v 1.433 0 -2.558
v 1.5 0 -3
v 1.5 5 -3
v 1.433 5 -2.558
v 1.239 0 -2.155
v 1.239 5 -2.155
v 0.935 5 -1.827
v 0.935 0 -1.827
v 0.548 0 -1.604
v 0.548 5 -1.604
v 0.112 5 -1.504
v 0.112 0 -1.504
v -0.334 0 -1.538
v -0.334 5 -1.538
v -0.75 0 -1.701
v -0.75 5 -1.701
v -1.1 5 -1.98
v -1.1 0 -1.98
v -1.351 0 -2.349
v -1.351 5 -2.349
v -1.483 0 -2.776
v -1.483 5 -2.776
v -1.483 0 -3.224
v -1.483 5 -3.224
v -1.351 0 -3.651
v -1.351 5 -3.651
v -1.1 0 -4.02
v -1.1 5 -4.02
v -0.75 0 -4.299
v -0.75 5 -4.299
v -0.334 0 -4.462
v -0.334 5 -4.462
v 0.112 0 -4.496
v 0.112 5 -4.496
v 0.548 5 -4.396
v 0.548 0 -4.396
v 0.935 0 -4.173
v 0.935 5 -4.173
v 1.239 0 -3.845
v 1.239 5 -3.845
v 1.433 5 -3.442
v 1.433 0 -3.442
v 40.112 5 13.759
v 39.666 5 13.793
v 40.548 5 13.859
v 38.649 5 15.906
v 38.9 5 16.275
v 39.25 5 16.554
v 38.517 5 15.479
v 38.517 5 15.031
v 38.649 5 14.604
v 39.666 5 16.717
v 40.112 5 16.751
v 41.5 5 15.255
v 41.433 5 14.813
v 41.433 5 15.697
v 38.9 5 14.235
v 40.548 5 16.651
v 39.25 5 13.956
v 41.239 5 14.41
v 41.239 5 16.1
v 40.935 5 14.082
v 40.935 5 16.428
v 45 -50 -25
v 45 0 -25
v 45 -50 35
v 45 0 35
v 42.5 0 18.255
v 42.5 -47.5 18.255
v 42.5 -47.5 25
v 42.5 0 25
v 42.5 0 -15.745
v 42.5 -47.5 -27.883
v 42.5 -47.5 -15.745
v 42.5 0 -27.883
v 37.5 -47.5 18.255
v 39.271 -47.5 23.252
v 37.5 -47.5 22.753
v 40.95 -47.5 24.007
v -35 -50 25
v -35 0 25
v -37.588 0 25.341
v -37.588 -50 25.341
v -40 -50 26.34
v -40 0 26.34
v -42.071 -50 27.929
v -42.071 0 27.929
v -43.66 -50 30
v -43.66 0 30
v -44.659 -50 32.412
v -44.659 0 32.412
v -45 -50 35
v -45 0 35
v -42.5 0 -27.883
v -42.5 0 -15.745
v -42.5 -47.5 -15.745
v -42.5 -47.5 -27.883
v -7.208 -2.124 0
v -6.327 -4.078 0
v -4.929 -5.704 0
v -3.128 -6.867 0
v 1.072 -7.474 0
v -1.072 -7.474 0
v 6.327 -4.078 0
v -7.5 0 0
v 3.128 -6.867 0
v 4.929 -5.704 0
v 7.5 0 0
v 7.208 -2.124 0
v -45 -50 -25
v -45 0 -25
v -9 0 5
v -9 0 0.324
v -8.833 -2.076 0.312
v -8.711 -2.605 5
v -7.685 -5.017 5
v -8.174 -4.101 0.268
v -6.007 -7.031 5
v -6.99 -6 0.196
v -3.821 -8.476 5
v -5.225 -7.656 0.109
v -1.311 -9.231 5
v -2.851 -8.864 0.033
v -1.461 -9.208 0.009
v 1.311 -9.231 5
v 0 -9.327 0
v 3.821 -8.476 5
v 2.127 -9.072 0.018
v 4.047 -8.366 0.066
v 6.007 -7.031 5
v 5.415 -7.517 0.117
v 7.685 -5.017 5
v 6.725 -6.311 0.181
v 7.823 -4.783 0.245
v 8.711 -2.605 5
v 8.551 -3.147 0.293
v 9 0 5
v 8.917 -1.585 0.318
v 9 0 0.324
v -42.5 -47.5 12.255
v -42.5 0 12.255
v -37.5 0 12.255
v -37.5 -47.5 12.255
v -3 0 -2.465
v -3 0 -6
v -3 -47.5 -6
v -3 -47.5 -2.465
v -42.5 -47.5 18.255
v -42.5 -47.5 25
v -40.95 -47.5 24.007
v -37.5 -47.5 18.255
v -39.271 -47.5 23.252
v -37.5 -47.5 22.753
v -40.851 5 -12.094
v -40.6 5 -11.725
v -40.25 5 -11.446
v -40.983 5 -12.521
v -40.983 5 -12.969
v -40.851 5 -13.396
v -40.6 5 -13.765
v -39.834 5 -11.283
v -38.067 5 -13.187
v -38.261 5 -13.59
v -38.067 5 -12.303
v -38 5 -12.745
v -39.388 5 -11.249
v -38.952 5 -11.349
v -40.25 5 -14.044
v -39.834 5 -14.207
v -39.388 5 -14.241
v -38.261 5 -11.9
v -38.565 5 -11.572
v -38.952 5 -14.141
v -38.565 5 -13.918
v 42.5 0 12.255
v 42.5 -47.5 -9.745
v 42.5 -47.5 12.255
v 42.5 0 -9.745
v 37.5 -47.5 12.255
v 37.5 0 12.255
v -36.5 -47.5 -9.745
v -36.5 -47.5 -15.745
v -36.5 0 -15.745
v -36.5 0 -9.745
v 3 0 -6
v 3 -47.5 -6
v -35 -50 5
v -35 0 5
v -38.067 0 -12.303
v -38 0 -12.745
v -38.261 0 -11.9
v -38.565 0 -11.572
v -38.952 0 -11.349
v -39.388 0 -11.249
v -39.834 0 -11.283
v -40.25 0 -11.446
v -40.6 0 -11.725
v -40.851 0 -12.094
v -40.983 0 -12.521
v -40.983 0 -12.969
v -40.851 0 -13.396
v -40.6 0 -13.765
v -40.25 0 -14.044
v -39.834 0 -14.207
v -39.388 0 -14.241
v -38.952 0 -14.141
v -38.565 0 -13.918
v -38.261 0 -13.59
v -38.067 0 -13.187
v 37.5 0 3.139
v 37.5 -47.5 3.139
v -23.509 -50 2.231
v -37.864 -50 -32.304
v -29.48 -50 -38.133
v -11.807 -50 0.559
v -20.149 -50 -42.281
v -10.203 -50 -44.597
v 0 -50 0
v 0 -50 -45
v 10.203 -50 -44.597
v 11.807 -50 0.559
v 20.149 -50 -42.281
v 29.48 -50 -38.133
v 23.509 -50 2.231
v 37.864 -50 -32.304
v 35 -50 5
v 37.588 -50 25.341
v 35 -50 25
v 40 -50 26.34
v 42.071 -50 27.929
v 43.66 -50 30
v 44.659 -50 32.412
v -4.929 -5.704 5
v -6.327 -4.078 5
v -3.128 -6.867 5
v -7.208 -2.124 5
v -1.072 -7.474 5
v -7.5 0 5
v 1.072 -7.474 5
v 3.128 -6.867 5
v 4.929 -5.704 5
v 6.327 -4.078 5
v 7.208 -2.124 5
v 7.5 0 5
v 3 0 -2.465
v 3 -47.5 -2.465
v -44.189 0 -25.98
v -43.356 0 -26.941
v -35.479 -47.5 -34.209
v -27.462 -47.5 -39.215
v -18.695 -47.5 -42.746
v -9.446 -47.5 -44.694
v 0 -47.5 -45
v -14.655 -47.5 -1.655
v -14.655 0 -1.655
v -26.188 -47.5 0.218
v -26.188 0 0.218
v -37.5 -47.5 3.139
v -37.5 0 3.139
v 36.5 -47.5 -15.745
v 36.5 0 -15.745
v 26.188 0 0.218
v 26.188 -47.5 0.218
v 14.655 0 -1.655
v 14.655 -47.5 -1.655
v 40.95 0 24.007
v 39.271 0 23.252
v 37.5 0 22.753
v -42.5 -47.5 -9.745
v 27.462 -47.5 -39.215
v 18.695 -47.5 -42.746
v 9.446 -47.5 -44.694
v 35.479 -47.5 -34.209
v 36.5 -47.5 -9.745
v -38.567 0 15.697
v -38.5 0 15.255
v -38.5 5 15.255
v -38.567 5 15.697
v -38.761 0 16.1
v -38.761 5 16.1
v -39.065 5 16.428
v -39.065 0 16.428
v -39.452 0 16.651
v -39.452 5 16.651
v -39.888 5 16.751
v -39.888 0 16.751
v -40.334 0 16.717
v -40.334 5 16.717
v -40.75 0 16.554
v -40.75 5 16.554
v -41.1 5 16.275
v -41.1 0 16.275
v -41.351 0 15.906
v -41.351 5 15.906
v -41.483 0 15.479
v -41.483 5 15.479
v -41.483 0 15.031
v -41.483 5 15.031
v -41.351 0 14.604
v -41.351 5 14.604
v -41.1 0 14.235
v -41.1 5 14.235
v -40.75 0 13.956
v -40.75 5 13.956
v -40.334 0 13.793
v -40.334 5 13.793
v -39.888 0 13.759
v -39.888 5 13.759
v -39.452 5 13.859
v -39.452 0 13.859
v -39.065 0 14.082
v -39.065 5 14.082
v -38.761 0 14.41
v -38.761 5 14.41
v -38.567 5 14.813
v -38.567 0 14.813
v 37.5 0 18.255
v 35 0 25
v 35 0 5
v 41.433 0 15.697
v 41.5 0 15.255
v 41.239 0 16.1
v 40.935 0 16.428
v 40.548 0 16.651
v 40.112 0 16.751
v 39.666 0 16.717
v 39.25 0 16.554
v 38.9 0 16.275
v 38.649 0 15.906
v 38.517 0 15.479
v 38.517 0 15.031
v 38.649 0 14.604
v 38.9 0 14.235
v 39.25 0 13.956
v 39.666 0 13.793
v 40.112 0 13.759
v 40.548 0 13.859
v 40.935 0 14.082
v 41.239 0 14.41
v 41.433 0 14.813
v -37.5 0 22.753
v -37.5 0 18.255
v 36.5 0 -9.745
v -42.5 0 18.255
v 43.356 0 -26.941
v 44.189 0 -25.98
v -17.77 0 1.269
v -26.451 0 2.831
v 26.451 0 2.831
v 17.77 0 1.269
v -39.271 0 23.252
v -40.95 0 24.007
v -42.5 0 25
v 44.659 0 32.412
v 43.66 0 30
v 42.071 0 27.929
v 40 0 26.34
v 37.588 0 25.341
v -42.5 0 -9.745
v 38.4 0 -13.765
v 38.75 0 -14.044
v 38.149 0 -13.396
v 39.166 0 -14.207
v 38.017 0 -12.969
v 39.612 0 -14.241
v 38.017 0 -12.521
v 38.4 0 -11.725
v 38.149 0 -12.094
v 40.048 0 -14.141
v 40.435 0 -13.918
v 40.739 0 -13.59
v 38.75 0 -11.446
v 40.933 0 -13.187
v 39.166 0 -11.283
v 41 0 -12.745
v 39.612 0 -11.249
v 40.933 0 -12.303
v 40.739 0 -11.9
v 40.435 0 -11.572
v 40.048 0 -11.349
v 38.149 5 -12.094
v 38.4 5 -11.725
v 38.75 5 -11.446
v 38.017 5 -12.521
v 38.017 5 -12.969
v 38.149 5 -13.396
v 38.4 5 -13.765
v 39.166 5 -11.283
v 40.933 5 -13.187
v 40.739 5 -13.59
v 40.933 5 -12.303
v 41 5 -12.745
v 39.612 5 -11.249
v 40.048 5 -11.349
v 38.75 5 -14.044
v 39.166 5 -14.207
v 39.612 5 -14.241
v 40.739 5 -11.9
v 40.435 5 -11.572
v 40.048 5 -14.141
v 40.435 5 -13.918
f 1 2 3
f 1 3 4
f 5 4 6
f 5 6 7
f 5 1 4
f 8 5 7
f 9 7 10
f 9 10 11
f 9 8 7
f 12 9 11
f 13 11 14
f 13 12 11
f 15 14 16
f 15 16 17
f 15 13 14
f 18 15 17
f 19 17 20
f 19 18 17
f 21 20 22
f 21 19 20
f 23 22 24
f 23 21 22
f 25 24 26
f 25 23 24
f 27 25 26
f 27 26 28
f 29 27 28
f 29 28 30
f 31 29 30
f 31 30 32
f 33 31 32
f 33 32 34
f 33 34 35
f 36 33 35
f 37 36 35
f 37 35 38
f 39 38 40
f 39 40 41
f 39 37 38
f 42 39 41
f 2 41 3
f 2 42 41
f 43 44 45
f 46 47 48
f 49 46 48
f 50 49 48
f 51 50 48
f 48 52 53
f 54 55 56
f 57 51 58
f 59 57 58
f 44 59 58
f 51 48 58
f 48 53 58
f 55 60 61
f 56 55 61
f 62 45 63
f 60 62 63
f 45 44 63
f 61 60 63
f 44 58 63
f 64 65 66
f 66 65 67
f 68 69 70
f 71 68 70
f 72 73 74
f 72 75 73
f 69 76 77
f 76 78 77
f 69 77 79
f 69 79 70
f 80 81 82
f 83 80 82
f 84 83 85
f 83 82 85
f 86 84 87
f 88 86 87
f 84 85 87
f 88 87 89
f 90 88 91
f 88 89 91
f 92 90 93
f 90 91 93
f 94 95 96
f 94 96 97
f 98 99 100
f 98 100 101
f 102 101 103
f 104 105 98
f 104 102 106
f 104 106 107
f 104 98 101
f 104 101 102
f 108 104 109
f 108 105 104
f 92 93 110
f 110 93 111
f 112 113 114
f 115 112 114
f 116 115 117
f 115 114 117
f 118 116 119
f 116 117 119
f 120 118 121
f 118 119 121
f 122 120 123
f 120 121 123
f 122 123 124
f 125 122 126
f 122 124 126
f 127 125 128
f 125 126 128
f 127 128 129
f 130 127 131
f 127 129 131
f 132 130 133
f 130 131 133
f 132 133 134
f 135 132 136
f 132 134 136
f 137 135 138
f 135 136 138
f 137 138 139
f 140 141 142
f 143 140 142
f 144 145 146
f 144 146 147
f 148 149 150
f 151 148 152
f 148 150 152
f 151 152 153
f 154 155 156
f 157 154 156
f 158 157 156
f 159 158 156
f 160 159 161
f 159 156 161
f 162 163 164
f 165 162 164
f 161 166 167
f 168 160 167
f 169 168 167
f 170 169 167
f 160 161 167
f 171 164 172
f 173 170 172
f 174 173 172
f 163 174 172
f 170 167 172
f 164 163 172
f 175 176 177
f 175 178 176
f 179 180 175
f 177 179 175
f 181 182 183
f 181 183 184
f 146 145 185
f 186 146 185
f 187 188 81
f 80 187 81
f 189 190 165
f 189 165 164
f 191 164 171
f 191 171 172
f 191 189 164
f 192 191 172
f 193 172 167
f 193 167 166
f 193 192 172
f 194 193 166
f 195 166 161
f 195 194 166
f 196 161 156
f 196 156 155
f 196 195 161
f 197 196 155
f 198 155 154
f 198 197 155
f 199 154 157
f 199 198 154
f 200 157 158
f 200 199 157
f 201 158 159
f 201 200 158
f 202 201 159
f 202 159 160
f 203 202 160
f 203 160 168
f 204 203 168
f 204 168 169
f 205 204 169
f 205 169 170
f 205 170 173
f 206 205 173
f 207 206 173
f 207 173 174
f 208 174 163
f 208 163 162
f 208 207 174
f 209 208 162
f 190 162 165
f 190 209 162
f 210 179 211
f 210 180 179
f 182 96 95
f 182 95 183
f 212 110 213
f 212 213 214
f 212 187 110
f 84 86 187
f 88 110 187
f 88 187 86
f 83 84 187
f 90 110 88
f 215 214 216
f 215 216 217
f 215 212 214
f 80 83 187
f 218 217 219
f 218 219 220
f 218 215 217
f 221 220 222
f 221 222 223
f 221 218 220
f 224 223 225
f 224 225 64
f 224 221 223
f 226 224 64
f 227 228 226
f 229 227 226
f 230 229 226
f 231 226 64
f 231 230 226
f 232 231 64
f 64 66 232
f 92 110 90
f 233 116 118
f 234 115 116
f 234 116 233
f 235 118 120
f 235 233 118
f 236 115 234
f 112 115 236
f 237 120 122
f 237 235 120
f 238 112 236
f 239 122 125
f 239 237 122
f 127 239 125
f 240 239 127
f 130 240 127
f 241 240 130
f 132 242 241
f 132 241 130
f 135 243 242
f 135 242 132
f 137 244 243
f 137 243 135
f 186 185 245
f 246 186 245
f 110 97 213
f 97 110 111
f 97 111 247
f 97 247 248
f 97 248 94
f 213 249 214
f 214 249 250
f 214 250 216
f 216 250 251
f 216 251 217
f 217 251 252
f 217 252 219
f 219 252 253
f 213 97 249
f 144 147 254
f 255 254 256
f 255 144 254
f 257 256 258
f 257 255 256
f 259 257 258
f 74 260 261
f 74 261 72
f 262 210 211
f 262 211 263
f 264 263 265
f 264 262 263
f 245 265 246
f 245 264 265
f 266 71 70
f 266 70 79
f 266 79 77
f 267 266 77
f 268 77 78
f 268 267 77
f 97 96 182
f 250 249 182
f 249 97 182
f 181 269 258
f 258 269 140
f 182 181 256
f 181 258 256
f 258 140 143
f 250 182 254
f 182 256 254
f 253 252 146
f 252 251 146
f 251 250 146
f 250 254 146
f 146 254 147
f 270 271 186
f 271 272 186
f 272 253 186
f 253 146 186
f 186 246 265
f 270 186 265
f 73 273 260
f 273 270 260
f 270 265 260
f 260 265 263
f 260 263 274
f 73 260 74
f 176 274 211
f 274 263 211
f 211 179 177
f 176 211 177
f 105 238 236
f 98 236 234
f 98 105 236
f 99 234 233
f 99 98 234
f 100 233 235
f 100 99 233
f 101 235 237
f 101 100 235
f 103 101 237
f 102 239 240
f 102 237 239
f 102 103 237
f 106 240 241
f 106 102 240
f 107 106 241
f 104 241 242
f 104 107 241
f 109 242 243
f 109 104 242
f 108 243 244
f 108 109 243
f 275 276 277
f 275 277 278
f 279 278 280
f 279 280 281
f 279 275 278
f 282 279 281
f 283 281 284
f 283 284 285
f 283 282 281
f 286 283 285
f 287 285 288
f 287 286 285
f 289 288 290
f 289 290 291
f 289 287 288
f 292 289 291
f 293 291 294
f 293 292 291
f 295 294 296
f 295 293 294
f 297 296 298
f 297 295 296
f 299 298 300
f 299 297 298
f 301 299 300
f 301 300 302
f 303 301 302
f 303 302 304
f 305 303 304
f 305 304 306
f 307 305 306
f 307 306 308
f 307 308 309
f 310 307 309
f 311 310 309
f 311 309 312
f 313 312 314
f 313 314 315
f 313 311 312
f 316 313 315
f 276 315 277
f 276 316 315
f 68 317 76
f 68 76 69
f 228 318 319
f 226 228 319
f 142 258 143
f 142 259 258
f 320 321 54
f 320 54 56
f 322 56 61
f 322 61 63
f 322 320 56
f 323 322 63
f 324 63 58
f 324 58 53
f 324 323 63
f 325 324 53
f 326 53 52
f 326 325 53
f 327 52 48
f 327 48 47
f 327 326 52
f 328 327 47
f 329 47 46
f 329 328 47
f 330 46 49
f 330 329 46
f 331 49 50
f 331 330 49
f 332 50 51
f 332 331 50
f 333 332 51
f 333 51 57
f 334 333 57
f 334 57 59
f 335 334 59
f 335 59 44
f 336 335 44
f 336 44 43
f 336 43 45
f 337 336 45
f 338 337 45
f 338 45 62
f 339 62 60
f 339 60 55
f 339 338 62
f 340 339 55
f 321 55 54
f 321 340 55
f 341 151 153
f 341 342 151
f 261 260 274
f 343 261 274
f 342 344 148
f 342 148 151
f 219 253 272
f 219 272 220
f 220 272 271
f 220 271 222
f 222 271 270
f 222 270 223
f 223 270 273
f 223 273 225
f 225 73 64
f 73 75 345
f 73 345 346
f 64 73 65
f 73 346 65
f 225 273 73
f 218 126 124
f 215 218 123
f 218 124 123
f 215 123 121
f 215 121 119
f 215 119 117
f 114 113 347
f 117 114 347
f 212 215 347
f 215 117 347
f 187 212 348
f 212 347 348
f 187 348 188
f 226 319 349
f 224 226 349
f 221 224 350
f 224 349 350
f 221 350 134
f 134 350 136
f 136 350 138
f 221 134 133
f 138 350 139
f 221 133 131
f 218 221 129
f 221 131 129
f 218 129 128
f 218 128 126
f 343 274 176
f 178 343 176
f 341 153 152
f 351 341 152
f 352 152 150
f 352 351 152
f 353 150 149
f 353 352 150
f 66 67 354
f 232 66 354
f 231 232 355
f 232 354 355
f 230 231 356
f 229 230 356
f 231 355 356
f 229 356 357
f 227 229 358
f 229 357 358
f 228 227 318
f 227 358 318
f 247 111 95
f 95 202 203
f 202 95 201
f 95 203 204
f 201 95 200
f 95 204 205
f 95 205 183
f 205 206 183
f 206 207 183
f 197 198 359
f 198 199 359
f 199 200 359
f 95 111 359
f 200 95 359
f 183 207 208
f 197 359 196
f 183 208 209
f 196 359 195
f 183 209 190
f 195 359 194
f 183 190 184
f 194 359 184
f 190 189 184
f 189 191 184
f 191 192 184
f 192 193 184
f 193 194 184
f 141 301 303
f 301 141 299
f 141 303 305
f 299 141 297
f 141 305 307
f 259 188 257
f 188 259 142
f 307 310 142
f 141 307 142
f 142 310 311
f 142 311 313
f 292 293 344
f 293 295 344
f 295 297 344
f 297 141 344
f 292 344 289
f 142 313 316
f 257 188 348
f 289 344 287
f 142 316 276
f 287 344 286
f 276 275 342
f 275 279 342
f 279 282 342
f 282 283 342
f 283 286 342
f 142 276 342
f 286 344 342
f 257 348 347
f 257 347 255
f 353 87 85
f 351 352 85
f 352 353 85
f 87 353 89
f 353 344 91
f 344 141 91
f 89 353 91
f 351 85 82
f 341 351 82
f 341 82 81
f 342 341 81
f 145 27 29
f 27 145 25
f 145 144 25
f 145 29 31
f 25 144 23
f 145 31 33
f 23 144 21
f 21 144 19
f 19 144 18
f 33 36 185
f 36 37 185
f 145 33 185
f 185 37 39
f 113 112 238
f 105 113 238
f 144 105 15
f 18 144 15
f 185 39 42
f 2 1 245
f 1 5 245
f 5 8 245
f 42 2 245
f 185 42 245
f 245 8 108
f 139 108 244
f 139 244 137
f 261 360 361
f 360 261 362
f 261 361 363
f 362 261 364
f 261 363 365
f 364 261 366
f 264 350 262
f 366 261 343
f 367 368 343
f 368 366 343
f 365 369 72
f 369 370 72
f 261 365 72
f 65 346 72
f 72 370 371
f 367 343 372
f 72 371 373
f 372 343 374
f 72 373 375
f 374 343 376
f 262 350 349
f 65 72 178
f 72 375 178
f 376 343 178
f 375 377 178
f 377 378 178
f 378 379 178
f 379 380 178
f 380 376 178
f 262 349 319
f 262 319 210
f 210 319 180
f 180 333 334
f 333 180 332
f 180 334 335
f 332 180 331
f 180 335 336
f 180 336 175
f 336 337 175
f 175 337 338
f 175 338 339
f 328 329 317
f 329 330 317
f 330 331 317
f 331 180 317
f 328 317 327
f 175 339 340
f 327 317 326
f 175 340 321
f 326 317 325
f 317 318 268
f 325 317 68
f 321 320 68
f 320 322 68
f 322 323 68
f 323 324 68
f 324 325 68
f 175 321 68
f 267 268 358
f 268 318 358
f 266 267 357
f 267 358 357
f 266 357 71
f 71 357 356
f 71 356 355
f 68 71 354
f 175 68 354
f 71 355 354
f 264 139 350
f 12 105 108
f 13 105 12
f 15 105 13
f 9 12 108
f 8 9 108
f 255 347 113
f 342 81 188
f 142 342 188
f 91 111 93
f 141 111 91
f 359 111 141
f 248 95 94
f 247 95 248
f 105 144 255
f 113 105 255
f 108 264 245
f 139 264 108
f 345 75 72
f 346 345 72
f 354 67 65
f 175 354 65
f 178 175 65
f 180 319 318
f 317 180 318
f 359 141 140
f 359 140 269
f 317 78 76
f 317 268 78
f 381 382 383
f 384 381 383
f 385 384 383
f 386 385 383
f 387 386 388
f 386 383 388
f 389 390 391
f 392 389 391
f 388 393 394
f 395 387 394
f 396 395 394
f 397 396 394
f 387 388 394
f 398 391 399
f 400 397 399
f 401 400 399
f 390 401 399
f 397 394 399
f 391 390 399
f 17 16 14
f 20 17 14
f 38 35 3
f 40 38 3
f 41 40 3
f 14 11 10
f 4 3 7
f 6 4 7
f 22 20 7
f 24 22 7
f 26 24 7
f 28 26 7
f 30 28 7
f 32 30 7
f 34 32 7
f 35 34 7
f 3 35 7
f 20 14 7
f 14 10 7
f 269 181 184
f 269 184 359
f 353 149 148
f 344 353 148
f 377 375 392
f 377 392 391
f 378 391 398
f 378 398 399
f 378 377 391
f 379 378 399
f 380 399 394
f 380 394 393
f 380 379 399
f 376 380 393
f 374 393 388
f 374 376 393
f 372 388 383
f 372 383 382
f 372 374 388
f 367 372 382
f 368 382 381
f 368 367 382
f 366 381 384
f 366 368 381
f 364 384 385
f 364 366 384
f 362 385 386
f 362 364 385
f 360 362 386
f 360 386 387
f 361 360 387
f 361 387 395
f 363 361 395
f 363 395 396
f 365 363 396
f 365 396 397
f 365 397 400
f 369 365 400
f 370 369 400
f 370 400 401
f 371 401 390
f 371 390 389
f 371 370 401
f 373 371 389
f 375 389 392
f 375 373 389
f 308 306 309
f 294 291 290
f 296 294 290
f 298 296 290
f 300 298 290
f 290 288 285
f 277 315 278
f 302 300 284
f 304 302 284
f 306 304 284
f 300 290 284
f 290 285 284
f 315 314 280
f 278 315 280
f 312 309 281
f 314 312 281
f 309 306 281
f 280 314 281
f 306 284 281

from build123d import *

# Parameters (mm, degrees)
F1_DEPTH  = 50
F2_T      = -2.5
F3_W      = 5
F3_H      = 6
F3_W_2    = 3
F3_W_3    = 6
F4_DEPTH  = 50
F5_R      = 1.5
F6_DEPTH  = 5
F8_DEPTH  = 5
F10_DEPTH = 6


with BuildPart() as f1:
    # F0 (on Front) → F1 (new body)
    with BuildSketch(Plane.XZ):
        with BuildLine():
            ThreePointArc((0, -45), (24.9125199529, -40.428169894), (45, -25))
            Line((45, -25), (0, -25))
            Line((0, -25), (0, -45))
        make_face()
        with BuildLine():
            Line((0, -25), (45, -25))
            Line((45, -25), (45, 25))
            Line((45, 25), (35, 25))
            Line((35, 25), (35, 5))
            ThreePointArc((35, 5), (17.6776695297, 1.2563132924), (0, 0))
            Line((0, 0), (0, -25))
        make_face()
        with BuildLine():
            Line((0, -45), (0, -25))
            Line((0, -25), (-45, -25))
            ThreePointArc((-45, -25), (-24.9125199529, -40.428169894), (0, -45))
        make_face()
        with BuildLine():
            Line((-45, -25), (0, -25))
            Line((0, -25), (0, 0))
            ThreePointArc((0, 0), (-17.6776695297, 1.2563132924), (-35, 5))
            Line((-35, 5), (-35, 25))
            Line((-35, 25), (-45, 25))
            Line((-45, 25), (-45, -25))
        make_face()
        with BuildLine():
            Line((35, 25), (45, 25))
            Line((45, 25), (45, 35))
            ThreePointArc((45, 35), (42.0710678119, 27.9289321881), (35, 25))
        make_face()
        with BuildLine():
            Line((-45, 35), (-45, 25))
            Line((-45, 25), (-35, 25))
            ThreePointArc((-35, 25), (-42.0710678119, 27.9289321881), (-45, 35))
        make_face()
    extrude(amount=F1_DEPTH)

    # F2
    f2_openings = [f1.faces().sort_by_distance(p)[0] for p in [
        (-24.91252, -25, -40.42817),
        (24.91252, -25, -40.42817),
        (0, 0, -15.155819),
    ]]
    offset(amount=F2_T, openings=f2_openings, kind=Kind.INTERSECTION)

    # F3 (on Front) → F4 (join)
    with BuildSketch(Plane.XZ):
        with Locations((-40, 15.2549841851)):
            Rectangle(F3_W, F3_H)
        with Locations((40, 15.2549841851)):
            Rectangle(F3_W, F3_H)
        with Locations((1.5, -3)):
            Rectangle(F3_W_2, F3_H)
        with Locations((-1.5, -3)):
            Rectangle(F3_W_2, F3_H)
        Polygon((-42.5, -9.7450158149), (-42.5, -12.7450158149), (-42.5, -15.7450158149), (-36.5, -15.7450158149), (-36.5, -9.7450158149), align=None)
        with Locations((39.5, -12.7450158149)):
            Rectangle(F3_W_3, F3_H)
    extrude(amount=F4_DEPTH)

    # F5 (on face) → F6 (join)
    with BuildSketch(Plane.XZ):
        with Locations((-40, 15.2549841851)):
            Circle(F5_R)
        with Locations((-39.5, -12.7450158149)):
            Circle(F5_R)
        with Locations((40, 15.2549841851)):
            Circle(F5_R)
        with Locations((39.5, -12.7450158149)):
            Circle(F5_R)
        with Locations((0, -3)):
            Circle(F5_R)
    extrude(amount=-F6_DEPTH)

    # F7 (on Top) → F8 (join)
    with BuildSketch(Plane.XY):
        with BuildLine():
            Line((9, 0), (-9, 0))
            ThreePointArc((-9, 0), (0, -9.3268755147), (9, 0))
        make_face()
    extrude(amount=F8_DEPTH)

    # F9 (on Top) → F10 (cut)
    with BuildSketch(Plane.XY):
        with BuildLine():
            Line((7.5, 0), (-7.5, 0))
            ThreePointArc((-7.5, 0), (0, -7.5508031077), (7.5, 0))
        make_face()
    extrude(amount=F10_DEPTH, mode=Mode.SUBTRACT)


solid = f1.part
